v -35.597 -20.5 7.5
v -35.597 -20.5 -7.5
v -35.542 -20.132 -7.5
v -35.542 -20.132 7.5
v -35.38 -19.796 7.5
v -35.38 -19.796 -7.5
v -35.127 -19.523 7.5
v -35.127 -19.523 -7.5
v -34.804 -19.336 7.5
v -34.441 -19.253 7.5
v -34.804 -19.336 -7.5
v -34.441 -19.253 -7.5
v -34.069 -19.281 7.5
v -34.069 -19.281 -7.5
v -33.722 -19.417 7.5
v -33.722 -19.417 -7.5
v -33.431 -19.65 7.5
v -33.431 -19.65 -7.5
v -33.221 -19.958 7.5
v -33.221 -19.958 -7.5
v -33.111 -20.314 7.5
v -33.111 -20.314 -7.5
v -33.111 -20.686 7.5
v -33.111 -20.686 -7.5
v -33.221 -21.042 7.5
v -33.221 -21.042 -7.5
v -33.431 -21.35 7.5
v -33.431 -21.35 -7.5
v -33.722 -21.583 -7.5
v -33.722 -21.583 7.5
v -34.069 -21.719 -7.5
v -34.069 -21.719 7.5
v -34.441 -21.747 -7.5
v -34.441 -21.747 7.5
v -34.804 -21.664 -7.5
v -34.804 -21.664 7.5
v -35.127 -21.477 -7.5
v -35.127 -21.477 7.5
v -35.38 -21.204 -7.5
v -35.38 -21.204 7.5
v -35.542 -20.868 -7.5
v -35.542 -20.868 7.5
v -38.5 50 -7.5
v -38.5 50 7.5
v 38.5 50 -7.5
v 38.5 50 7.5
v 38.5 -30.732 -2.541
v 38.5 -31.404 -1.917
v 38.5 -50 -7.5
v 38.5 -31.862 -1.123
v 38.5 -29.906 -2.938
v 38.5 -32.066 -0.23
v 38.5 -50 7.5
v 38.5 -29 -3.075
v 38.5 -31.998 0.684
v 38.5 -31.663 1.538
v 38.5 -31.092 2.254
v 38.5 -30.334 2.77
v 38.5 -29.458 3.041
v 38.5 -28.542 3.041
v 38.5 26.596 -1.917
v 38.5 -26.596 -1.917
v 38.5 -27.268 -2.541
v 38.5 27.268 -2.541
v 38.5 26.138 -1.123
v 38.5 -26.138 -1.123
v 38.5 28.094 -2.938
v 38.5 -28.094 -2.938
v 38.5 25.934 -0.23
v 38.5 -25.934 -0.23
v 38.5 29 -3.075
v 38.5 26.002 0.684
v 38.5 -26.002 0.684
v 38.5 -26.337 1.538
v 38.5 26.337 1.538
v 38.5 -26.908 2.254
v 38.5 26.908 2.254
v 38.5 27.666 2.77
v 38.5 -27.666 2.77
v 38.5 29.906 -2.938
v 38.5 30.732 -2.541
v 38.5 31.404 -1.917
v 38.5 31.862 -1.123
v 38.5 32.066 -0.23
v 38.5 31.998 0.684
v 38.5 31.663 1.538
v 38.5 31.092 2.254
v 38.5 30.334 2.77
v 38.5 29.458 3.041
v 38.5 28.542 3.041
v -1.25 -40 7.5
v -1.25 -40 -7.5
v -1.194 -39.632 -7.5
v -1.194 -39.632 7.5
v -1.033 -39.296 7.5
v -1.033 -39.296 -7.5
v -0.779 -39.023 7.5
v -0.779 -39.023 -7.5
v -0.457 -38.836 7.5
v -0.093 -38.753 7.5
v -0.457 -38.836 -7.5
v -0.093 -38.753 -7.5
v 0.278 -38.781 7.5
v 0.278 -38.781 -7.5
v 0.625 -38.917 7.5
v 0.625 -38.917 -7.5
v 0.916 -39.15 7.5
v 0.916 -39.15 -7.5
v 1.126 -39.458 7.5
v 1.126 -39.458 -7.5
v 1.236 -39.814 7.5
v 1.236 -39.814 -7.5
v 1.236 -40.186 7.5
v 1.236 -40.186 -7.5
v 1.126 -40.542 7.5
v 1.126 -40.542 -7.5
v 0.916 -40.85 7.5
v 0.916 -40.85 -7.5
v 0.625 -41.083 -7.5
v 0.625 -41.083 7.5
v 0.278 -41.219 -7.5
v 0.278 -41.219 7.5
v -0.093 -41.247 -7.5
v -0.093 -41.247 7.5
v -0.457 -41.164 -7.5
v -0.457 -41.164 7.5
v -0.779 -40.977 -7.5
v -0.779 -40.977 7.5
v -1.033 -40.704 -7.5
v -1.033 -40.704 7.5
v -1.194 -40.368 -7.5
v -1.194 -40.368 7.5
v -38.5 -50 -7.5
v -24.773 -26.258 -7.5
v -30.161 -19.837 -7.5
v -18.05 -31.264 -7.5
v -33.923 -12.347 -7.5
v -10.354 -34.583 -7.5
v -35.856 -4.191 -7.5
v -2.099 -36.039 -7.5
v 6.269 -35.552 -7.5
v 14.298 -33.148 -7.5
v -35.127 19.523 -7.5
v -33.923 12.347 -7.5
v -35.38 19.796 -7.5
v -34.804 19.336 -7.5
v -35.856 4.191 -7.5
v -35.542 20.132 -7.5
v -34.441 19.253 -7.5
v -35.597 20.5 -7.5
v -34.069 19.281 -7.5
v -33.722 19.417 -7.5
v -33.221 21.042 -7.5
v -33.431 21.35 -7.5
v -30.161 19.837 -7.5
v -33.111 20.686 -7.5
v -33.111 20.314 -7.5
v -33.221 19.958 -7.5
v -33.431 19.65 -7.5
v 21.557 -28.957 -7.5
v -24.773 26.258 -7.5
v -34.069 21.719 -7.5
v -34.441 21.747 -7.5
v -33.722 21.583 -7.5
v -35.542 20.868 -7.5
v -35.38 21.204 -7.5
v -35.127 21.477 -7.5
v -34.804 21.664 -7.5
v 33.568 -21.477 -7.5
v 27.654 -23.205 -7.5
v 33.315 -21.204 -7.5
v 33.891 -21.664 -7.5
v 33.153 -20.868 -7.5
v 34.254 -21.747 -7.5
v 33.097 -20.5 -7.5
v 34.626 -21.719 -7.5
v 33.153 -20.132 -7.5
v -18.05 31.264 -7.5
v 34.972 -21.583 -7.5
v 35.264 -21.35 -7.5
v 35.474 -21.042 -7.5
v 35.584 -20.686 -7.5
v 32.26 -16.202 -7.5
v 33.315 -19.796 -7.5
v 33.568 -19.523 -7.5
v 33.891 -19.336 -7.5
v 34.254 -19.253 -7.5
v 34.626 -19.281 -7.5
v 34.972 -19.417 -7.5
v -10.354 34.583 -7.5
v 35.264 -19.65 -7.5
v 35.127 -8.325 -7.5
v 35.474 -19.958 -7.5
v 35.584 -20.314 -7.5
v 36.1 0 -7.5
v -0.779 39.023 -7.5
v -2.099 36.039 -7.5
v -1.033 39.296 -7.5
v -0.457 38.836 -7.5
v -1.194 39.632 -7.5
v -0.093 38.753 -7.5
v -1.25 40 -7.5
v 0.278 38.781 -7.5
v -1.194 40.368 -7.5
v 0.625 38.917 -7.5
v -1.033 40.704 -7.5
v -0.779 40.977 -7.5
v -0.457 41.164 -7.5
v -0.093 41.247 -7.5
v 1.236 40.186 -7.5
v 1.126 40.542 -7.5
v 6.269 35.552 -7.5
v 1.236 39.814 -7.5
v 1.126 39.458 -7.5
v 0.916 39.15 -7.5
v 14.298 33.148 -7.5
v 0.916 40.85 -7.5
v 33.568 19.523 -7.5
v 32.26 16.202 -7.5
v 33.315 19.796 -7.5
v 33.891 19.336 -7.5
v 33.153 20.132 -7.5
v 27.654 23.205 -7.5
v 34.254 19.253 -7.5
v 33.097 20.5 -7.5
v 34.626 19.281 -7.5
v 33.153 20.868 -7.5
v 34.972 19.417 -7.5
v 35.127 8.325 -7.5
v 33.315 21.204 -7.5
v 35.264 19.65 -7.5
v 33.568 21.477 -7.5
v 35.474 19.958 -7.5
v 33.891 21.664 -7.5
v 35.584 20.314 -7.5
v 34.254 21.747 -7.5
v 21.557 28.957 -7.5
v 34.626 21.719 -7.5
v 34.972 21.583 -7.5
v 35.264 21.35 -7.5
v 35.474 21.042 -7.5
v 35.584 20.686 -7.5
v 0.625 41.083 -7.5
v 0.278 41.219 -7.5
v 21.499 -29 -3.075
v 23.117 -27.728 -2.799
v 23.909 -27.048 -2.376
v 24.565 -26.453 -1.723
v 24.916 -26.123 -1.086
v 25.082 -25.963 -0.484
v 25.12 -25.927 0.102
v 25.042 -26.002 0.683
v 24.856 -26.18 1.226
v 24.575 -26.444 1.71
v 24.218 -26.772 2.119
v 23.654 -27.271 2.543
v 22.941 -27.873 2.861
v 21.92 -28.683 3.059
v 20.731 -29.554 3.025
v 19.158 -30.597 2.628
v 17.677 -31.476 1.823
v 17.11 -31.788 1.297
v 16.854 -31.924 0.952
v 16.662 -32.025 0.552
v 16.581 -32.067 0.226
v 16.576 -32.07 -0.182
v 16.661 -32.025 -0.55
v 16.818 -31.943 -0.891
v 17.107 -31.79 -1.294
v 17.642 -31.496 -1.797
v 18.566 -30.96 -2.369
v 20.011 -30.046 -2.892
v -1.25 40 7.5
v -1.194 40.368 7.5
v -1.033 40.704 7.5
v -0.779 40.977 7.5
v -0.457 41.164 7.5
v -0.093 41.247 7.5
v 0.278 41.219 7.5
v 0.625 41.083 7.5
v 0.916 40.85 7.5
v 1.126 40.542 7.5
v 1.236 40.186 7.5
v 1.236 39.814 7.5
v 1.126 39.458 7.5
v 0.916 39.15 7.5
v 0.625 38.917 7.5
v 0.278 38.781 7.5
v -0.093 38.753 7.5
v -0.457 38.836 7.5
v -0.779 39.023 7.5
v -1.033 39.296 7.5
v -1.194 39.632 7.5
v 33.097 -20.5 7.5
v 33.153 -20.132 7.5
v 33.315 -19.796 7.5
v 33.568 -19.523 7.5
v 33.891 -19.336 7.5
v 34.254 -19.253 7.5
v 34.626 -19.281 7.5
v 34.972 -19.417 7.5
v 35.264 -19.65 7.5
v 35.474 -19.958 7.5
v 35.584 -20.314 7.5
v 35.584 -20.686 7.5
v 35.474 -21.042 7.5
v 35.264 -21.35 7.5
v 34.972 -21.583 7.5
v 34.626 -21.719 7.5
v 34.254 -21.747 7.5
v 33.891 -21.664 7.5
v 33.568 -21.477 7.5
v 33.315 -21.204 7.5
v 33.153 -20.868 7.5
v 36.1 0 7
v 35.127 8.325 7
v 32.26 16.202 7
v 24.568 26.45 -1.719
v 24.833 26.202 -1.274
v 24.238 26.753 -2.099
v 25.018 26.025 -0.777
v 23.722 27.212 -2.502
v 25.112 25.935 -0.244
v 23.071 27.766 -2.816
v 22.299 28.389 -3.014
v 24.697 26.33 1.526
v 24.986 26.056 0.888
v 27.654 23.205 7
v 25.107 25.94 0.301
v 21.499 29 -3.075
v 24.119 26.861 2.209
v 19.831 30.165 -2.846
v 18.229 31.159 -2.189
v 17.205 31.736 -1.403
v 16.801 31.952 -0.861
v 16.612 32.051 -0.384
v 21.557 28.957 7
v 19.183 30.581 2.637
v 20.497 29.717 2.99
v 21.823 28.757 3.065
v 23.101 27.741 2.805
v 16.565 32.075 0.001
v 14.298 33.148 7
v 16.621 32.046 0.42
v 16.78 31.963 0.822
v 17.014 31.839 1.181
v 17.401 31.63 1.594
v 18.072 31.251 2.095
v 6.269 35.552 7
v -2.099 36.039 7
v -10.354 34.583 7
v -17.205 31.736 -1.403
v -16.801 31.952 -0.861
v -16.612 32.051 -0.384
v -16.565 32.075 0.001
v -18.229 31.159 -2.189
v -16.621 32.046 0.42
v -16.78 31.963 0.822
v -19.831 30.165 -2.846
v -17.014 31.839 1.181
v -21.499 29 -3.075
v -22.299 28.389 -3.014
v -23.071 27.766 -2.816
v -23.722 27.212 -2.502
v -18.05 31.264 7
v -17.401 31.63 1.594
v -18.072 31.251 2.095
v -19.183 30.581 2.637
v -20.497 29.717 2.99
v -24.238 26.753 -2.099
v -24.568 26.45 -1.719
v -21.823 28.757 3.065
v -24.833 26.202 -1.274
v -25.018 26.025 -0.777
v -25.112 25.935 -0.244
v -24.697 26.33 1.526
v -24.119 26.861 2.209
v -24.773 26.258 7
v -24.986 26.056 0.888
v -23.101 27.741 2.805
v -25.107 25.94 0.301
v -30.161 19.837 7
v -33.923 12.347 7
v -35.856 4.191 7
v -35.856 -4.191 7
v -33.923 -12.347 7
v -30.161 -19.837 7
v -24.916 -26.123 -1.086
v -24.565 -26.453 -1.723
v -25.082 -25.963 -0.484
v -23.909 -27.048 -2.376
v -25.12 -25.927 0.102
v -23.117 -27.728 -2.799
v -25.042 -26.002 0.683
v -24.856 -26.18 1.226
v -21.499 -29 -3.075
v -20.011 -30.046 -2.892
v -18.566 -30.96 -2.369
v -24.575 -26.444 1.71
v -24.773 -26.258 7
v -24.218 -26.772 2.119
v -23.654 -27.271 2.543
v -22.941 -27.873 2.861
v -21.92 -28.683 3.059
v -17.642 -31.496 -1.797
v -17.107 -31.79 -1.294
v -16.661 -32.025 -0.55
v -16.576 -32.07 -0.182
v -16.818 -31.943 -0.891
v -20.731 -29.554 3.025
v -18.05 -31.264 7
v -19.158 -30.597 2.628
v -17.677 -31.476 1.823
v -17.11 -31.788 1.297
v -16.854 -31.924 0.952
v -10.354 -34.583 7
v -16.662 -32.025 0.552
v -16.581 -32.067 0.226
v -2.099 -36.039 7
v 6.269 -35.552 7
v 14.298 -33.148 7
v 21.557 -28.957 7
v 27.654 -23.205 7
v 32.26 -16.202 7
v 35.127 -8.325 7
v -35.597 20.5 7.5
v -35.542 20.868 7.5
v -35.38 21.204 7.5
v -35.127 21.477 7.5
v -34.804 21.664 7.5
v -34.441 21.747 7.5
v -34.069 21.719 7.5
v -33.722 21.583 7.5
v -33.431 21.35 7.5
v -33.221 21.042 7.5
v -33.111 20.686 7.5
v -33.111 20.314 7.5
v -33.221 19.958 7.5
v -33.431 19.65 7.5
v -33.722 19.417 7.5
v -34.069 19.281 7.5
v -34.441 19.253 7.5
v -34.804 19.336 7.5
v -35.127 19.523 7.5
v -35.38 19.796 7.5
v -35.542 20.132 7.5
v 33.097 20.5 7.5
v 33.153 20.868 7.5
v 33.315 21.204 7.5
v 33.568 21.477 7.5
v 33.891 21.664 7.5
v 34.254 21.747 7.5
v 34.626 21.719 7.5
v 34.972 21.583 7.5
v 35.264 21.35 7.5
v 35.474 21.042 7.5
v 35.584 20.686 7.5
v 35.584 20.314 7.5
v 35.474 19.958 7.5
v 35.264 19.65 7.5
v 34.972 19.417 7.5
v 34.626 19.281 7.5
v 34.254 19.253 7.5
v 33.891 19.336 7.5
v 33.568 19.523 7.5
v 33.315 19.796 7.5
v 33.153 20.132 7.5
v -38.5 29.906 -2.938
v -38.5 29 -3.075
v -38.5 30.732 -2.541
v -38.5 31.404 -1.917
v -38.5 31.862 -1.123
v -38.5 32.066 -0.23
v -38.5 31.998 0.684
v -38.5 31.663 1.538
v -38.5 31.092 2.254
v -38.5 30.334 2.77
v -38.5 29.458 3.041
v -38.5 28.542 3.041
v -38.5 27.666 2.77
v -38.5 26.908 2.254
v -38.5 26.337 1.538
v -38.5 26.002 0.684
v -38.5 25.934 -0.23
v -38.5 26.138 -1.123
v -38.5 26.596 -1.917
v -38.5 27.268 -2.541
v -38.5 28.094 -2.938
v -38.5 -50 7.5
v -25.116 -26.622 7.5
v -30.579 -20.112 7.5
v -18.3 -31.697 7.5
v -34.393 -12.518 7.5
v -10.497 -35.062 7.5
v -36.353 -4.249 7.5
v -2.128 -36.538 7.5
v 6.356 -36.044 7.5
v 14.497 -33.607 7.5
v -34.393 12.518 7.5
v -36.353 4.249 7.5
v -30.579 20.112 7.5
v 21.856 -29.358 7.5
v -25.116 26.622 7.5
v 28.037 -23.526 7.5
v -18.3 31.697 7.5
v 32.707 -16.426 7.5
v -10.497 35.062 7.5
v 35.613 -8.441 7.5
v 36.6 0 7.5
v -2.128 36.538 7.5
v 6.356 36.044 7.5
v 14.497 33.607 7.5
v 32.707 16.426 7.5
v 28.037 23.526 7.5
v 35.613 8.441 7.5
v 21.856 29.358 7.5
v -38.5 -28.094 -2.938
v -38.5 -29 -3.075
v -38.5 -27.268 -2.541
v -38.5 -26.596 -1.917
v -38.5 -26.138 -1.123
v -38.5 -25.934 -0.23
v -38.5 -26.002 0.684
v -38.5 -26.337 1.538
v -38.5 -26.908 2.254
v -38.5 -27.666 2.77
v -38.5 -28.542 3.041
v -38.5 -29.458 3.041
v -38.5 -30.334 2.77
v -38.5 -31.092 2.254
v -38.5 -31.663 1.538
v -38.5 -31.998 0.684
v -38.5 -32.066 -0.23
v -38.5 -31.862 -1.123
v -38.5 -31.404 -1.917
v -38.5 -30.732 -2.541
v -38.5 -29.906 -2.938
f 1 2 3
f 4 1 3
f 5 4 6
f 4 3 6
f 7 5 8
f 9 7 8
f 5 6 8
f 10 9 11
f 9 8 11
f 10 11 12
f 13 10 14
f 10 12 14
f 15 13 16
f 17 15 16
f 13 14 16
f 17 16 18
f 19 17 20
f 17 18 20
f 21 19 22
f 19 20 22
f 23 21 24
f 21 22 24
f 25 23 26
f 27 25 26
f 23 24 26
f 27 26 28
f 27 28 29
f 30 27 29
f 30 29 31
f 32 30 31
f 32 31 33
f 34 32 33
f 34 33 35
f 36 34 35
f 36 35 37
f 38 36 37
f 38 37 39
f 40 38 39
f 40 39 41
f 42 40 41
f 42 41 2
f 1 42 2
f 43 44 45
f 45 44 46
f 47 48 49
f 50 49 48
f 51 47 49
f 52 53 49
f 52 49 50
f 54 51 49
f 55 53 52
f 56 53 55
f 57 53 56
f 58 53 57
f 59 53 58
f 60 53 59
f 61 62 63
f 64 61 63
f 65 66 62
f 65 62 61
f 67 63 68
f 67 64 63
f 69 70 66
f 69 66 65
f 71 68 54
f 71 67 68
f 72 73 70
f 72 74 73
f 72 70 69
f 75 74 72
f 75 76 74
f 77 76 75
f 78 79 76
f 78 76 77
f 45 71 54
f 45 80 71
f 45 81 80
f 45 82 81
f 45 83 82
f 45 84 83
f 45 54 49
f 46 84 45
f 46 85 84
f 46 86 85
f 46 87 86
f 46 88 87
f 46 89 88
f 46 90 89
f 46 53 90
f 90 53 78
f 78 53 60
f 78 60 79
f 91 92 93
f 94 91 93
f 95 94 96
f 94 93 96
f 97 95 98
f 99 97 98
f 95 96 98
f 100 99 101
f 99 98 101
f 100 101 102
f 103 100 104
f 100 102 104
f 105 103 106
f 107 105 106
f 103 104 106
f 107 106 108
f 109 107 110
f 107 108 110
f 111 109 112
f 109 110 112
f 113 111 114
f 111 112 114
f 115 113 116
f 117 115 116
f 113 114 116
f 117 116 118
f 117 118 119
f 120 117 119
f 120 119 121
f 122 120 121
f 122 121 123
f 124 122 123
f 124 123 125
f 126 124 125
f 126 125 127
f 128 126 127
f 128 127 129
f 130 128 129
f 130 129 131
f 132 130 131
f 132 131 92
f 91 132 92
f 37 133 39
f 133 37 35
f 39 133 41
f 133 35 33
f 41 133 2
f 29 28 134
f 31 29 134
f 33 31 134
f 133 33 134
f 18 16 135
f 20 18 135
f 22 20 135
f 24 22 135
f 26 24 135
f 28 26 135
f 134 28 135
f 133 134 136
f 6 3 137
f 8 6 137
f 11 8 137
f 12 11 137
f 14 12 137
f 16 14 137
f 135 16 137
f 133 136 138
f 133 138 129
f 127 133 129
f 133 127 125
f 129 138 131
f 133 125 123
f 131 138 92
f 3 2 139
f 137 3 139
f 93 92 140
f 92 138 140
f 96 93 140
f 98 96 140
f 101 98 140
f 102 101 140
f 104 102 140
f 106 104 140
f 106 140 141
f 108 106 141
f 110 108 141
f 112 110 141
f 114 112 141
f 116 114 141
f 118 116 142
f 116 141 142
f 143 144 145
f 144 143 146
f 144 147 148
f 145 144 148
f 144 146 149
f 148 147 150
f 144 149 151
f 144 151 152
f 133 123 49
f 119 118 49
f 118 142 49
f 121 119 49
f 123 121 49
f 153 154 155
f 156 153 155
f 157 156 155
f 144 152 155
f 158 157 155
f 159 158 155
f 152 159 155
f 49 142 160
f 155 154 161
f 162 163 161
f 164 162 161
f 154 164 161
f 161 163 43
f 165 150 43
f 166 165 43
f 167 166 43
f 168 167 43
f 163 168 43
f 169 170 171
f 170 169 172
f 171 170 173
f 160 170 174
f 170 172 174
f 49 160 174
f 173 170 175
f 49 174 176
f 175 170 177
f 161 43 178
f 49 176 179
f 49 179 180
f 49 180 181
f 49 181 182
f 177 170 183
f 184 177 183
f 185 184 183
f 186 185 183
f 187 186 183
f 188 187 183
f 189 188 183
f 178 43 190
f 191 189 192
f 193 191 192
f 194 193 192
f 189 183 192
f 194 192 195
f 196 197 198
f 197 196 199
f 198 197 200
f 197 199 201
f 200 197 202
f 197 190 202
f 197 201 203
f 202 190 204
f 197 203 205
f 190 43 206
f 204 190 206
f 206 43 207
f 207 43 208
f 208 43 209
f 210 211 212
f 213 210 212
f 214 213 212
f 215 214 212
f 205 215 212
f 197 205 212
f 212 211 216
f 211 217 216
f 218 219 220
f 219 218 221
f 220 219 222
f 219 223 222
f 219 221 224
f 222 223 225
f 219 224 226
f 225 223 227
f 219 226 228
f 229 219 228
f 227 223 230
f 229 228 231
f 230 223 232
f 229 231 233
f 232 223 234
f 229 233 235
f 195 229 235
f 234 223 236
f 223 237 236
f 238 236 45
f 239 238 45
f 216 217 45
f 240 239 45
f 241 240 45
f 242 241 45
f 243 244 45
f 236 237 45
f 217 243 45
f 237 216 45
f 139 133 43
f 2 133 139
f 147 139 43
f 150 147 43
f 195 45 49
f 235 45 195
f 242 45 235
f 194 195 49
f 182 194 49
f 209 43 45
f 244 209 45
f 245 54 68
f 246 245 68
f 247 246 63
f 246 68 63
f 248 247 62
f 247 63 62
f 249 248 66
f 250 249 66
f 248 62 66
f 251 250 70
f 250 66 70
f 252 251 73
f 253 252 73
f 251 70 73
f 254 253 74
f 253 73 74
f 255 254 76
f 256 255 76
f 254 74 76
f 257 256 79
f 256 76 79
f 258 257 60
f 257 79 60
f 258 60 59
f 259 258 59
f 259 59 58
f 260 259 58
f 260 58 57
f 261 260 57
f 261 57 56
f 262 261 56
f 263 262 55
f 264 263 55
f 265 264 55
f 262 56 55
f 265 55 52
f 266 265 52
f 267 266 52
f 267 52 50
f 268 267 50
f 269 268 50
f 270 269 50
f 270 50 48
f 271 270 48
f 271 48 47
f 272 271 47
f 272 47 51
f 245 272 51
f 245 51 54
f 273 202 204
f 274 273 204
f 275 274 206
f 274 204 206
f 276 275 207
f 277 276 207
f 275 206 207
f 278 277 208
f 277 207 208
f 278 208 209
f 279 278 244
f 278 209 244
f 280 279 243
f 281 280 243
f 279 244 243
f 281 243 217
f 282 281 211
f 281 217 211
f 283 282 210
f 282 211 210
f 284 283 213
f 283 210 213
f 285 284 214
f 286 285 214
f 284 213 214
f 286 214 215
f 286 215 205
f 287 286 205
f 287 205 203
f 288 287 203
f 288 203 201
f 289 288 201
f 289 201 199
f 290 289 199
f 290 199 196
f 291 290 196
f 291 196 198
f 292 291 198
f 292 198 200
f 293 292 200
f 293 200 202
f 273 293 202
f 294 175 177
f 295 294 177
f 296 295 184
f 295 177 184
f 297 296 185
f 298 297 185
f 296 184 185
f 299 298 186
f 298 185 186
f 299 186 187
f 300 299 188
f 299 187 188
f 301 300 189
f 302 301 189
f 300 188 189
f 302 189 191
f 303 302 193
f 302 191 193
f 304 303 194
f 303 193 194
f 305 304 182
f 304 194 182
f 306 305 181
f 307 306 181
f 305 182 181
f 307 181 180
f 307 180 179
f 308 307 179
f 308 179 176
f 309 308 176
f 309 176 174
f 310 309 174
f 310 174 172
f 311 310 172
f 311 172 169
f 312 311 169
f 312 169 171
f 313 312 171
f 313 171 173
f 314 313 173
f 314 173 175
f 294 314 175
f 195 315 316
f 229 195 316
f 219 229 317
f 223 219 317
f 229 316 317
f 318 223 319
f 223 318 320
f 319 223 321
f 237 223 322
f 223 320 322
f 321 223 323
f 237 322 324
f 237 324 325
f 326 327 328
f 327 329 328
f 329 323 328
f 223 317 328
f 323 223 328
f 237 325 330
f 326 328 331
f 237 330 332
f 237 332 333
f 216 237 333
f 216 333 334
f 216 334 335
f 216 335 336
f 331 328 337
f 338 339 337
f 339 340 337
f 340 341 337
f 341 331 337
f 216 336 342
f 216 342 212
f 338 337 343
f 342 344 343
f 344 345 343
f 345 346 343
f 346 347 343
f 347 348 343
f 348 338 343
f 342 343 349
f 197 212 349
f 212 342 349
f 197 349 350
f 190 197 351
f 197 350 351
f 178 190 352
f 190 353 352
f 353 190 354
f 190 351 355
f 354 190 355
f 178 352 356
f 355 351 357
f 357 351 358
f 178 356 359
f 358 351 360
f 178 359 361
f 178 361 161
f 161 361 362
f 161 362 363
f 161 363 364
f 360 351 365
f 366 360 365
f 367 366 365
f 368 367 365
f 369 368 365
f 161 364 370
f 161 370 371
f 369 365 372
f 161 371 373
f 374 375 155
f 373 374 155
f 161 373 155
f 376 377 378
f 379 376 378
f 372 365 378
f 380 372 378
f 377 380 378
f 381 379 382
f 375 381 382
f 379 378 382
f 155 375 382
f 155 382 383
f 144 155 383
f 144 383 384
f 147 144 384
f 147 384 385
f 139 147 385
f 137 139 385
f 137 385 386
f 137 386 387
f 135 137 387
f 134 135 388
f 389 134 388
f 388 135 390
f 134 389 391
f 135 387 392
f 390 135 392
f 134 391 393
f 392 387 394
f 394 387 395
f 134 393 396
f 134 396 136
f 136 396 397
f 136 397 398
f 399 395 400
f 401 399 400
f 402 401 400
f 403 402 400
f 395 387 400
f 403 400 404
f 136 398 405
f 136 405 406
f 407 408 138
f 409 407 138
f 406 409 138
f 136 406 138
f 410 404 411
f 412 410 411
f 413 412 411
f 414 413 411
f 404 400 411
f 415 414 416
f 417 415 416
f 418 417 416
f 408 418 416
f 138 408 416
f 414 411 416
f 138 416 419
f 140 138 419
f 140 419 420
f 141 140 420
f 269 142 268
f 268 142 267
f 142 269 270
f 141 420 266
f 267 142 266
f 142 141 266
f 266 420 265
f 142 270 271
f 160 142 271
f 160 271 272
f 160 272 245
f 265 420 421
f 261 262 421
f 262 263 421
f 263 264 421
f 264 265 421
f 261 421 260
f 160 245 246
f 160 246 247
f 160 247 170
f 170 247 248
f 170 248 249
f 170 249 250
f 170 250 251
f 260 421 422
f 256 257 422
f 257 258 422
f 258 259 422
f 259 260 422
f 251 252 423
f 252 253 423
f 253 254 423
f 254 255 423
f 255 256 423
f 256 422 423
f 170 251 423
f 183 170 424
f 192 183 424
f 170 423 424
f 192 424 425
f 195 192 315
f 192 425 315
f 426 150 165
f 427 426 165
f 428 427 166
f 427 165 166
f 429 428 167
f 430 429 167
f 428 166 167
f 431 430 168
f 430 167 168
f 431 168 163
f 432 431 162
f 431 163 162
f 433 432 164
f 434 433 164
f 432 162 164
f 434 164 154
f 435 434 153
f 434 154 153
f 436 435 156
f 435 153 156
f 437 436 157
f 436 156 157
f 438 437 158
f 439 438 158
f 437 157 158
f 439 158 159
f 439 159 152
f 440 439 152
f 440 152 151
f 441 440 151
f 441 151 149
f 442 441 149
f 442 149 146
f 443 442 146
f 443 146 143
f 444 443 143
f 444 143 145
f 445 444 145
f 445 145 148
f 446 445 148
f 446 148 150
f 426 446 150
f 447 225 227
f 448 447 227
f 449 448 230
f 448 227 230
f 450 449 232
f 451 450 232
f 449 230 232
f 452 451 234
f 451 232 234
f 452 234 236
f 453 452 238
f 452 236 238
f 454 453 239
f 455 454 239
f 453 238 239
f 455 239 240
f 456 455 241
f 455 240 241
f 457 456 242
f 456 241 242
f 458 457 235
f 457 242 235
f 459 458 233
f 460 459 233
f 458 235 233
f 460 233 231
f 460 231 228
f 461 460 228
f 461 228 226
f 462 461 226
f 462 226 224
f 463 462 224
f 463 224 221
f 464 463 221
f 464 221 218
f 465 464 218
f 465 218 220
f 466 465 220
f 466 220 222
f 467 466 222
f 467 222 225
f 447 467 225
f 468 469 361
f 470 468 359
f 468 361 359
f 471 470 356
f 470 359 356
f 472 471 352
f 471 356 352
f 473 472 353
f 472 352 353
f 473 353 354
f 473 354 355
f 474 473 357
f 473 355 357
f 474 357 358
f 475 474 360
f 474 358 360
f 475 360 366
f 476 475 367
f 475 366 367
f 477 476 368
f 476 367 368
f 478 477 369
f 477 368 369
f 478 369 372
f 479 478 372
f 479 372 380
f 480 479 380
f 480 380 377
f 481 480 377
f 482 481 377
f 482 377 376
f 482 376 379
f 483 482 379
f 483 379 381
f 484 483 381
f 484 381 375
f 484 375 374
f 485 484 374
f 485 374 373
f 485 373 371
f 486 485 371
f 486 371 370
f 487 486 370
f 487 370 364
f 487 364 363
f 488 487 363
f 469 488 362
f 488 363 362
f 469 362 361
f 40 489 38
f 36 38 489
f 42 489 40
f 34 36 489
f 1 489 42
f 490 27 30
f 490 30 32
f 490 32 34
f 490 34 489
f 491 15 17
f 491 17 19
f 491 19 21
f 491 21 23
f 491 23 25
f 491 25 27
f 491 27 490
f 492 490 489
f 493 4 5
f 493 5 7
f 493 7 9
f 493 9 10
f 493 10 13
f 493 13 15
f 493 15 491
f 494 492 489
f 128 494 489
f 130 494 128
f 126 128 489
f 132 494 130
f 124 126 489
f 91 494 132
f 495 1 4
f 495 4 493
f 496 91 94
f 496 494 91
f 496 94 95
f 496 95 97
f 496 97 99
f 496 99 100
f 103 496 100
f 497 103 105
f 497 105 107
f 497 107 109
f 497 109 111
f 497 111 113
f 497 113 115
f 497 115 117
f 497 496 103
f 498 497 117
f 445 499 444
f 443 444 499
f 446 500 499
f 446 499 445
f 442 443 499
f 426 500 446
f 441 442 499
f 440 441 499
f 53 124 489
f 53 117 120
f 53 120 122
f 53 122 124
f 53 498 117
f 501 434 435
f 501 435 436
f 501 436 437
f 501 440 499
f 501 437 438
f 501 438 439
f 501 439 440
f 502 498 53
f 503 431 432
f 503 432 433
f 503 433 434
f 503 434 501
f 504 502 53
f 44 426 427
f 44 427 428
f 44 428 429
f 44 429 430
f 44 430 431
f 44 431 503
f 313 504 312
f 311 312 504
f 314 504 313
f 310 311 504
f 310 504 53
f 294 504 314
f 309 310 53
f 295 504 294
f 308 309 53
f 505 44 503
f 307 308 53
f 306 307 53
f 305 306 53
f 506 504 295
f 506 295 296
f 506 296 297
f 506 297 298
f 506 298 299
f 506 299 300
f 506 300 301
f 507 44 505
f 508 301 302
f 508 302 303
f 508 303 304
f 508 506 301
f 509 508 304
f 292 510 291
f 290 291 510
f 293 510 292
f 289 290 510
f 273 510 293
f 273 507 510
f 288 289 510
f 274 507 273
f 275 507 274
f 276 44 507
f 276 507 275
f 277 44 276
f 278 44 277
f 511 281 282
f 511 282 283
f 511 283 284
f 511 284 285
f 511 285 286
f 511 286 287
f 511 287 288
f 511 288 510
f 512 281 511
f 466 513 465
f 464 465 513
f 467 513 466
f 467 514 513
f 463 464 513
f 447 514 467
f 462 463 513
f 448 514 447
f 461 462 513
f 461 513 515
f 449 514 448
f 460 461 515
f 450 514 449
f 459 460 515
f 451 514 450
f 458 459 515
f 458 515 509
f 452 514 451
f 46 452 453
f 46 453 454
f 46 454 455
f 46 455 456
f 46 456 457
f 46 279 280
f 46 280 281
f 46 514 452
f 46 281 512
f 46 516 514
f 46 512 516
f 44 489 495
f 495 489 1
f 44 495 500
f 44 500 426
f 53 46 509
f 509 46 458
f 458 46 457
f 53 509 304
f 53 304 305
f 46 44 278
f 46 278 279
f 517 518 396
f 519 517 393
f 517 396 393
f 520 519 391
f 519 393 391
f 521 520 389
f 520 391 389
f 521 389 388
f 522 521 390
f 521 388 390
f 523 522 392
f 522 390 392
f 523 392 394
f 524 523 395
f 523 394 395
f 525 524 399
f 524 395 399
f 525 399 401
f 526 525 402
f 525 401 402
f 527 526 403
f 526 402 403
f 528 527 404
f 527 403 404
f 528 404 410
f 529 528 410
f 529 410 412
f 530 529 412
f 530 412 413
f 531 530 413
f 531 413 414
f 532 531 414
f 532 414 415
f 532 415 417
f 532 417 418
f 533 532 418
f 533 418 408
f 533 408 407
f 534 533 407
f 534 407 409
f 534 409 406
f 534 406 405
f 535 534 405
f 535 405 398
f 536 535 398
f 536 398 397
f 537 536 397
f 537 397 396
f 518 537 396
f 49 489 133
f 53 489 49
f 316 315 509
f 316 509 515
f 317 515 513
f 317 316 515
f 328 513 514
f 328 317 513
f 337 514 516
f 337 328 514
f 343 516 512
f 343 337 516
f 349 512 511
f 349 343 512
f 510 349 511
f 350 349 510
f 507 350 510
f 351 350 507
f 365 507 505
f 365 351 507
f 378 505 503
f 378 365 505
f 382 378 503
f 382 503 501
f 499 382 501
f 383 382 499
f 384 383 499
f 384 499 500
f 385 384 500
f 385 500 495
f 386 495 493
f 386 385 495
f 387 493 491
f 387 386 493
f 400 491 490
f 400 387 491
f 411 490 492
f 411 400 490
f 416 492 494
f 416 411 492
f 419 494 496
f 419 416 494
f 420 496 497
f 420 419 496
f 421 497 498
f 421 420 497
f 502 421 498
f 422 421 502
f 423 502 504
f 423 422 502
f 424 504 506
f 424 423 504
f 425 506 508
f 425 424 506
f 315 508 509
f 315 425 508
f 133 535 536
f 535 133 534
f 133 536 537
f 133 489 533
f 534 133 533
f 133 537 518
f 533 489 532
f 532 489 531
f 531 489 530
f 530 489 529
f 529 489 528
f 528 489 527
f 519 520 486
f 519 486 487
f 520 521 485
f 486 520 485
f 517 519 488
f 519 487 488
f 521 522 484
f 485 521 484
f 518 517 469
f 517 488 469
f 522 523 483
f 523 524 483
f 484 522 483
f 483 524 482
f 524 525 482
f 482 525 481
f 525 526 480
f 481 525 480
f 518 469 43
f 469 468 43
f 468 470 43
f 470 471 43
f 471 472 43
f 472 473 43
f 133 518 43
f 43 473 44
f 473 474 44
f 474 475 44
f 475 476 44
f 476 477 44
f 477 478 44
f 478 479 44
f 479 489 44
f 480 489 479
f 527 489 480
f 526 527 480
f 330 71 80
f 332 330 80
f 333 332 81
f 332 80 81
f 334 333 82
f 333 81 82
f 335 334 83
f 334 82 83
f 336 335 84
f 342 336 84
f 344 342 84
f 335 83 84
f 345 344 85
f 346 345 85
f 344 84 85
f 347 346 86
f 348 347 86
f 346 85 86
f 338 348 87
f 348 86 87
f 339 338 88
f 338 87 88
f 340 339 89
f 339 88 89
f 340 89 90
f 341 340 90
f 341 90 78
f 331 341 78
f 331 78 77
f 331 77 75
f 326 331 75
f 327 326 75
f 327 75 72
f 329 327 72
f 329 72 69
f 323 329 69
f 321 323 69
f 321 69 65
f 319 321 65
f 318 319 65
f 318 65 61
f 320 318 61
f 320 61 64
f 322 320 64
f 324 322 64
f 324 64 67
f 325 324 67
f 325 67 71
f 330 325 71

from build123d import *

# Parameters (mm, degrees)
SKIZZE1_W                       = 77
SKIZZE1_H                       = 100
AUFSATZ_LINEAR_AUSTRAGEN1_DEPTH = 7.5
SKIZZE2_R                       = 36.1
SCHNITT_LINEAR_AUSTRAGEN1_DEPTH = 65.863317831
SKIZZE3_R                       = 3.075
SCHNITT_LINEAR_AUSTRAGEN2_DEPTH = 93.115416734
FASE1_SIZE                      = 0.5
M3_GEWINDEBOHRUNG1_D            = 2.5


with BuildPart() as part:
    # Skizze1 → Aufsatz-Linear austragen1 (new, symmetric)
    with BuildSketch(Plane.XY):
        Rectangle(SKIZZE1_W, SKIZZE1_H)
    extrude(amount=AUFSATZ_LINEAR_AUSTRAGEN1_DEPTH, both=True)

    # Skizze2 → Schnitt-Linear austragen1 (cut, through all)
    with BuildSketch(Plane.XY.offset(7.5)):
        Circle(SKIZZE2_R)
    extrude(amount=-SCHNITT_LINEAR_AUSTRAGEN1_DEPTH, mode=Mode.SUBTRACT)

    # Skizze3 → Schnitt-Linear austragen2 (cut, through all)
    with BuildSketch(Plane(origin=(38.5, 0, 0), x_dir=(0, 0, -1), z_dir=(1, 0, 0))):
        with Locations((0, 29)):
            Circle(SKIZZE3_R)
        with Locations((0, -29)):
            Circle(SKIZZE3_R)
    extrude(amount=-SCHNITT_LINEAR_AUSTRAGEN2_DEPTH, mode=Mode.SUBTRACT)

    # Fase1
    fase1_edges = [part.edges().sort_by_distance(p)[0] for p in [
        (-36.1, 0, 7.5),
    ]]
    chamfer(fase1_edges, length=FASE1_SIZE)

    # M3 Gewindebohrung1 (through all)
    with Locations(Plane.XY.offset(7.5)):
        with Locations((-34.347488991, 20.5), (0, 40), (0, -40), (34.347488991, -20.5), (34.347488991, 20.5), (-34.347488991, -20.5)):
            Hole(M3_GEWINDEBOHRUNG1_D / 2)


solid = part.part
